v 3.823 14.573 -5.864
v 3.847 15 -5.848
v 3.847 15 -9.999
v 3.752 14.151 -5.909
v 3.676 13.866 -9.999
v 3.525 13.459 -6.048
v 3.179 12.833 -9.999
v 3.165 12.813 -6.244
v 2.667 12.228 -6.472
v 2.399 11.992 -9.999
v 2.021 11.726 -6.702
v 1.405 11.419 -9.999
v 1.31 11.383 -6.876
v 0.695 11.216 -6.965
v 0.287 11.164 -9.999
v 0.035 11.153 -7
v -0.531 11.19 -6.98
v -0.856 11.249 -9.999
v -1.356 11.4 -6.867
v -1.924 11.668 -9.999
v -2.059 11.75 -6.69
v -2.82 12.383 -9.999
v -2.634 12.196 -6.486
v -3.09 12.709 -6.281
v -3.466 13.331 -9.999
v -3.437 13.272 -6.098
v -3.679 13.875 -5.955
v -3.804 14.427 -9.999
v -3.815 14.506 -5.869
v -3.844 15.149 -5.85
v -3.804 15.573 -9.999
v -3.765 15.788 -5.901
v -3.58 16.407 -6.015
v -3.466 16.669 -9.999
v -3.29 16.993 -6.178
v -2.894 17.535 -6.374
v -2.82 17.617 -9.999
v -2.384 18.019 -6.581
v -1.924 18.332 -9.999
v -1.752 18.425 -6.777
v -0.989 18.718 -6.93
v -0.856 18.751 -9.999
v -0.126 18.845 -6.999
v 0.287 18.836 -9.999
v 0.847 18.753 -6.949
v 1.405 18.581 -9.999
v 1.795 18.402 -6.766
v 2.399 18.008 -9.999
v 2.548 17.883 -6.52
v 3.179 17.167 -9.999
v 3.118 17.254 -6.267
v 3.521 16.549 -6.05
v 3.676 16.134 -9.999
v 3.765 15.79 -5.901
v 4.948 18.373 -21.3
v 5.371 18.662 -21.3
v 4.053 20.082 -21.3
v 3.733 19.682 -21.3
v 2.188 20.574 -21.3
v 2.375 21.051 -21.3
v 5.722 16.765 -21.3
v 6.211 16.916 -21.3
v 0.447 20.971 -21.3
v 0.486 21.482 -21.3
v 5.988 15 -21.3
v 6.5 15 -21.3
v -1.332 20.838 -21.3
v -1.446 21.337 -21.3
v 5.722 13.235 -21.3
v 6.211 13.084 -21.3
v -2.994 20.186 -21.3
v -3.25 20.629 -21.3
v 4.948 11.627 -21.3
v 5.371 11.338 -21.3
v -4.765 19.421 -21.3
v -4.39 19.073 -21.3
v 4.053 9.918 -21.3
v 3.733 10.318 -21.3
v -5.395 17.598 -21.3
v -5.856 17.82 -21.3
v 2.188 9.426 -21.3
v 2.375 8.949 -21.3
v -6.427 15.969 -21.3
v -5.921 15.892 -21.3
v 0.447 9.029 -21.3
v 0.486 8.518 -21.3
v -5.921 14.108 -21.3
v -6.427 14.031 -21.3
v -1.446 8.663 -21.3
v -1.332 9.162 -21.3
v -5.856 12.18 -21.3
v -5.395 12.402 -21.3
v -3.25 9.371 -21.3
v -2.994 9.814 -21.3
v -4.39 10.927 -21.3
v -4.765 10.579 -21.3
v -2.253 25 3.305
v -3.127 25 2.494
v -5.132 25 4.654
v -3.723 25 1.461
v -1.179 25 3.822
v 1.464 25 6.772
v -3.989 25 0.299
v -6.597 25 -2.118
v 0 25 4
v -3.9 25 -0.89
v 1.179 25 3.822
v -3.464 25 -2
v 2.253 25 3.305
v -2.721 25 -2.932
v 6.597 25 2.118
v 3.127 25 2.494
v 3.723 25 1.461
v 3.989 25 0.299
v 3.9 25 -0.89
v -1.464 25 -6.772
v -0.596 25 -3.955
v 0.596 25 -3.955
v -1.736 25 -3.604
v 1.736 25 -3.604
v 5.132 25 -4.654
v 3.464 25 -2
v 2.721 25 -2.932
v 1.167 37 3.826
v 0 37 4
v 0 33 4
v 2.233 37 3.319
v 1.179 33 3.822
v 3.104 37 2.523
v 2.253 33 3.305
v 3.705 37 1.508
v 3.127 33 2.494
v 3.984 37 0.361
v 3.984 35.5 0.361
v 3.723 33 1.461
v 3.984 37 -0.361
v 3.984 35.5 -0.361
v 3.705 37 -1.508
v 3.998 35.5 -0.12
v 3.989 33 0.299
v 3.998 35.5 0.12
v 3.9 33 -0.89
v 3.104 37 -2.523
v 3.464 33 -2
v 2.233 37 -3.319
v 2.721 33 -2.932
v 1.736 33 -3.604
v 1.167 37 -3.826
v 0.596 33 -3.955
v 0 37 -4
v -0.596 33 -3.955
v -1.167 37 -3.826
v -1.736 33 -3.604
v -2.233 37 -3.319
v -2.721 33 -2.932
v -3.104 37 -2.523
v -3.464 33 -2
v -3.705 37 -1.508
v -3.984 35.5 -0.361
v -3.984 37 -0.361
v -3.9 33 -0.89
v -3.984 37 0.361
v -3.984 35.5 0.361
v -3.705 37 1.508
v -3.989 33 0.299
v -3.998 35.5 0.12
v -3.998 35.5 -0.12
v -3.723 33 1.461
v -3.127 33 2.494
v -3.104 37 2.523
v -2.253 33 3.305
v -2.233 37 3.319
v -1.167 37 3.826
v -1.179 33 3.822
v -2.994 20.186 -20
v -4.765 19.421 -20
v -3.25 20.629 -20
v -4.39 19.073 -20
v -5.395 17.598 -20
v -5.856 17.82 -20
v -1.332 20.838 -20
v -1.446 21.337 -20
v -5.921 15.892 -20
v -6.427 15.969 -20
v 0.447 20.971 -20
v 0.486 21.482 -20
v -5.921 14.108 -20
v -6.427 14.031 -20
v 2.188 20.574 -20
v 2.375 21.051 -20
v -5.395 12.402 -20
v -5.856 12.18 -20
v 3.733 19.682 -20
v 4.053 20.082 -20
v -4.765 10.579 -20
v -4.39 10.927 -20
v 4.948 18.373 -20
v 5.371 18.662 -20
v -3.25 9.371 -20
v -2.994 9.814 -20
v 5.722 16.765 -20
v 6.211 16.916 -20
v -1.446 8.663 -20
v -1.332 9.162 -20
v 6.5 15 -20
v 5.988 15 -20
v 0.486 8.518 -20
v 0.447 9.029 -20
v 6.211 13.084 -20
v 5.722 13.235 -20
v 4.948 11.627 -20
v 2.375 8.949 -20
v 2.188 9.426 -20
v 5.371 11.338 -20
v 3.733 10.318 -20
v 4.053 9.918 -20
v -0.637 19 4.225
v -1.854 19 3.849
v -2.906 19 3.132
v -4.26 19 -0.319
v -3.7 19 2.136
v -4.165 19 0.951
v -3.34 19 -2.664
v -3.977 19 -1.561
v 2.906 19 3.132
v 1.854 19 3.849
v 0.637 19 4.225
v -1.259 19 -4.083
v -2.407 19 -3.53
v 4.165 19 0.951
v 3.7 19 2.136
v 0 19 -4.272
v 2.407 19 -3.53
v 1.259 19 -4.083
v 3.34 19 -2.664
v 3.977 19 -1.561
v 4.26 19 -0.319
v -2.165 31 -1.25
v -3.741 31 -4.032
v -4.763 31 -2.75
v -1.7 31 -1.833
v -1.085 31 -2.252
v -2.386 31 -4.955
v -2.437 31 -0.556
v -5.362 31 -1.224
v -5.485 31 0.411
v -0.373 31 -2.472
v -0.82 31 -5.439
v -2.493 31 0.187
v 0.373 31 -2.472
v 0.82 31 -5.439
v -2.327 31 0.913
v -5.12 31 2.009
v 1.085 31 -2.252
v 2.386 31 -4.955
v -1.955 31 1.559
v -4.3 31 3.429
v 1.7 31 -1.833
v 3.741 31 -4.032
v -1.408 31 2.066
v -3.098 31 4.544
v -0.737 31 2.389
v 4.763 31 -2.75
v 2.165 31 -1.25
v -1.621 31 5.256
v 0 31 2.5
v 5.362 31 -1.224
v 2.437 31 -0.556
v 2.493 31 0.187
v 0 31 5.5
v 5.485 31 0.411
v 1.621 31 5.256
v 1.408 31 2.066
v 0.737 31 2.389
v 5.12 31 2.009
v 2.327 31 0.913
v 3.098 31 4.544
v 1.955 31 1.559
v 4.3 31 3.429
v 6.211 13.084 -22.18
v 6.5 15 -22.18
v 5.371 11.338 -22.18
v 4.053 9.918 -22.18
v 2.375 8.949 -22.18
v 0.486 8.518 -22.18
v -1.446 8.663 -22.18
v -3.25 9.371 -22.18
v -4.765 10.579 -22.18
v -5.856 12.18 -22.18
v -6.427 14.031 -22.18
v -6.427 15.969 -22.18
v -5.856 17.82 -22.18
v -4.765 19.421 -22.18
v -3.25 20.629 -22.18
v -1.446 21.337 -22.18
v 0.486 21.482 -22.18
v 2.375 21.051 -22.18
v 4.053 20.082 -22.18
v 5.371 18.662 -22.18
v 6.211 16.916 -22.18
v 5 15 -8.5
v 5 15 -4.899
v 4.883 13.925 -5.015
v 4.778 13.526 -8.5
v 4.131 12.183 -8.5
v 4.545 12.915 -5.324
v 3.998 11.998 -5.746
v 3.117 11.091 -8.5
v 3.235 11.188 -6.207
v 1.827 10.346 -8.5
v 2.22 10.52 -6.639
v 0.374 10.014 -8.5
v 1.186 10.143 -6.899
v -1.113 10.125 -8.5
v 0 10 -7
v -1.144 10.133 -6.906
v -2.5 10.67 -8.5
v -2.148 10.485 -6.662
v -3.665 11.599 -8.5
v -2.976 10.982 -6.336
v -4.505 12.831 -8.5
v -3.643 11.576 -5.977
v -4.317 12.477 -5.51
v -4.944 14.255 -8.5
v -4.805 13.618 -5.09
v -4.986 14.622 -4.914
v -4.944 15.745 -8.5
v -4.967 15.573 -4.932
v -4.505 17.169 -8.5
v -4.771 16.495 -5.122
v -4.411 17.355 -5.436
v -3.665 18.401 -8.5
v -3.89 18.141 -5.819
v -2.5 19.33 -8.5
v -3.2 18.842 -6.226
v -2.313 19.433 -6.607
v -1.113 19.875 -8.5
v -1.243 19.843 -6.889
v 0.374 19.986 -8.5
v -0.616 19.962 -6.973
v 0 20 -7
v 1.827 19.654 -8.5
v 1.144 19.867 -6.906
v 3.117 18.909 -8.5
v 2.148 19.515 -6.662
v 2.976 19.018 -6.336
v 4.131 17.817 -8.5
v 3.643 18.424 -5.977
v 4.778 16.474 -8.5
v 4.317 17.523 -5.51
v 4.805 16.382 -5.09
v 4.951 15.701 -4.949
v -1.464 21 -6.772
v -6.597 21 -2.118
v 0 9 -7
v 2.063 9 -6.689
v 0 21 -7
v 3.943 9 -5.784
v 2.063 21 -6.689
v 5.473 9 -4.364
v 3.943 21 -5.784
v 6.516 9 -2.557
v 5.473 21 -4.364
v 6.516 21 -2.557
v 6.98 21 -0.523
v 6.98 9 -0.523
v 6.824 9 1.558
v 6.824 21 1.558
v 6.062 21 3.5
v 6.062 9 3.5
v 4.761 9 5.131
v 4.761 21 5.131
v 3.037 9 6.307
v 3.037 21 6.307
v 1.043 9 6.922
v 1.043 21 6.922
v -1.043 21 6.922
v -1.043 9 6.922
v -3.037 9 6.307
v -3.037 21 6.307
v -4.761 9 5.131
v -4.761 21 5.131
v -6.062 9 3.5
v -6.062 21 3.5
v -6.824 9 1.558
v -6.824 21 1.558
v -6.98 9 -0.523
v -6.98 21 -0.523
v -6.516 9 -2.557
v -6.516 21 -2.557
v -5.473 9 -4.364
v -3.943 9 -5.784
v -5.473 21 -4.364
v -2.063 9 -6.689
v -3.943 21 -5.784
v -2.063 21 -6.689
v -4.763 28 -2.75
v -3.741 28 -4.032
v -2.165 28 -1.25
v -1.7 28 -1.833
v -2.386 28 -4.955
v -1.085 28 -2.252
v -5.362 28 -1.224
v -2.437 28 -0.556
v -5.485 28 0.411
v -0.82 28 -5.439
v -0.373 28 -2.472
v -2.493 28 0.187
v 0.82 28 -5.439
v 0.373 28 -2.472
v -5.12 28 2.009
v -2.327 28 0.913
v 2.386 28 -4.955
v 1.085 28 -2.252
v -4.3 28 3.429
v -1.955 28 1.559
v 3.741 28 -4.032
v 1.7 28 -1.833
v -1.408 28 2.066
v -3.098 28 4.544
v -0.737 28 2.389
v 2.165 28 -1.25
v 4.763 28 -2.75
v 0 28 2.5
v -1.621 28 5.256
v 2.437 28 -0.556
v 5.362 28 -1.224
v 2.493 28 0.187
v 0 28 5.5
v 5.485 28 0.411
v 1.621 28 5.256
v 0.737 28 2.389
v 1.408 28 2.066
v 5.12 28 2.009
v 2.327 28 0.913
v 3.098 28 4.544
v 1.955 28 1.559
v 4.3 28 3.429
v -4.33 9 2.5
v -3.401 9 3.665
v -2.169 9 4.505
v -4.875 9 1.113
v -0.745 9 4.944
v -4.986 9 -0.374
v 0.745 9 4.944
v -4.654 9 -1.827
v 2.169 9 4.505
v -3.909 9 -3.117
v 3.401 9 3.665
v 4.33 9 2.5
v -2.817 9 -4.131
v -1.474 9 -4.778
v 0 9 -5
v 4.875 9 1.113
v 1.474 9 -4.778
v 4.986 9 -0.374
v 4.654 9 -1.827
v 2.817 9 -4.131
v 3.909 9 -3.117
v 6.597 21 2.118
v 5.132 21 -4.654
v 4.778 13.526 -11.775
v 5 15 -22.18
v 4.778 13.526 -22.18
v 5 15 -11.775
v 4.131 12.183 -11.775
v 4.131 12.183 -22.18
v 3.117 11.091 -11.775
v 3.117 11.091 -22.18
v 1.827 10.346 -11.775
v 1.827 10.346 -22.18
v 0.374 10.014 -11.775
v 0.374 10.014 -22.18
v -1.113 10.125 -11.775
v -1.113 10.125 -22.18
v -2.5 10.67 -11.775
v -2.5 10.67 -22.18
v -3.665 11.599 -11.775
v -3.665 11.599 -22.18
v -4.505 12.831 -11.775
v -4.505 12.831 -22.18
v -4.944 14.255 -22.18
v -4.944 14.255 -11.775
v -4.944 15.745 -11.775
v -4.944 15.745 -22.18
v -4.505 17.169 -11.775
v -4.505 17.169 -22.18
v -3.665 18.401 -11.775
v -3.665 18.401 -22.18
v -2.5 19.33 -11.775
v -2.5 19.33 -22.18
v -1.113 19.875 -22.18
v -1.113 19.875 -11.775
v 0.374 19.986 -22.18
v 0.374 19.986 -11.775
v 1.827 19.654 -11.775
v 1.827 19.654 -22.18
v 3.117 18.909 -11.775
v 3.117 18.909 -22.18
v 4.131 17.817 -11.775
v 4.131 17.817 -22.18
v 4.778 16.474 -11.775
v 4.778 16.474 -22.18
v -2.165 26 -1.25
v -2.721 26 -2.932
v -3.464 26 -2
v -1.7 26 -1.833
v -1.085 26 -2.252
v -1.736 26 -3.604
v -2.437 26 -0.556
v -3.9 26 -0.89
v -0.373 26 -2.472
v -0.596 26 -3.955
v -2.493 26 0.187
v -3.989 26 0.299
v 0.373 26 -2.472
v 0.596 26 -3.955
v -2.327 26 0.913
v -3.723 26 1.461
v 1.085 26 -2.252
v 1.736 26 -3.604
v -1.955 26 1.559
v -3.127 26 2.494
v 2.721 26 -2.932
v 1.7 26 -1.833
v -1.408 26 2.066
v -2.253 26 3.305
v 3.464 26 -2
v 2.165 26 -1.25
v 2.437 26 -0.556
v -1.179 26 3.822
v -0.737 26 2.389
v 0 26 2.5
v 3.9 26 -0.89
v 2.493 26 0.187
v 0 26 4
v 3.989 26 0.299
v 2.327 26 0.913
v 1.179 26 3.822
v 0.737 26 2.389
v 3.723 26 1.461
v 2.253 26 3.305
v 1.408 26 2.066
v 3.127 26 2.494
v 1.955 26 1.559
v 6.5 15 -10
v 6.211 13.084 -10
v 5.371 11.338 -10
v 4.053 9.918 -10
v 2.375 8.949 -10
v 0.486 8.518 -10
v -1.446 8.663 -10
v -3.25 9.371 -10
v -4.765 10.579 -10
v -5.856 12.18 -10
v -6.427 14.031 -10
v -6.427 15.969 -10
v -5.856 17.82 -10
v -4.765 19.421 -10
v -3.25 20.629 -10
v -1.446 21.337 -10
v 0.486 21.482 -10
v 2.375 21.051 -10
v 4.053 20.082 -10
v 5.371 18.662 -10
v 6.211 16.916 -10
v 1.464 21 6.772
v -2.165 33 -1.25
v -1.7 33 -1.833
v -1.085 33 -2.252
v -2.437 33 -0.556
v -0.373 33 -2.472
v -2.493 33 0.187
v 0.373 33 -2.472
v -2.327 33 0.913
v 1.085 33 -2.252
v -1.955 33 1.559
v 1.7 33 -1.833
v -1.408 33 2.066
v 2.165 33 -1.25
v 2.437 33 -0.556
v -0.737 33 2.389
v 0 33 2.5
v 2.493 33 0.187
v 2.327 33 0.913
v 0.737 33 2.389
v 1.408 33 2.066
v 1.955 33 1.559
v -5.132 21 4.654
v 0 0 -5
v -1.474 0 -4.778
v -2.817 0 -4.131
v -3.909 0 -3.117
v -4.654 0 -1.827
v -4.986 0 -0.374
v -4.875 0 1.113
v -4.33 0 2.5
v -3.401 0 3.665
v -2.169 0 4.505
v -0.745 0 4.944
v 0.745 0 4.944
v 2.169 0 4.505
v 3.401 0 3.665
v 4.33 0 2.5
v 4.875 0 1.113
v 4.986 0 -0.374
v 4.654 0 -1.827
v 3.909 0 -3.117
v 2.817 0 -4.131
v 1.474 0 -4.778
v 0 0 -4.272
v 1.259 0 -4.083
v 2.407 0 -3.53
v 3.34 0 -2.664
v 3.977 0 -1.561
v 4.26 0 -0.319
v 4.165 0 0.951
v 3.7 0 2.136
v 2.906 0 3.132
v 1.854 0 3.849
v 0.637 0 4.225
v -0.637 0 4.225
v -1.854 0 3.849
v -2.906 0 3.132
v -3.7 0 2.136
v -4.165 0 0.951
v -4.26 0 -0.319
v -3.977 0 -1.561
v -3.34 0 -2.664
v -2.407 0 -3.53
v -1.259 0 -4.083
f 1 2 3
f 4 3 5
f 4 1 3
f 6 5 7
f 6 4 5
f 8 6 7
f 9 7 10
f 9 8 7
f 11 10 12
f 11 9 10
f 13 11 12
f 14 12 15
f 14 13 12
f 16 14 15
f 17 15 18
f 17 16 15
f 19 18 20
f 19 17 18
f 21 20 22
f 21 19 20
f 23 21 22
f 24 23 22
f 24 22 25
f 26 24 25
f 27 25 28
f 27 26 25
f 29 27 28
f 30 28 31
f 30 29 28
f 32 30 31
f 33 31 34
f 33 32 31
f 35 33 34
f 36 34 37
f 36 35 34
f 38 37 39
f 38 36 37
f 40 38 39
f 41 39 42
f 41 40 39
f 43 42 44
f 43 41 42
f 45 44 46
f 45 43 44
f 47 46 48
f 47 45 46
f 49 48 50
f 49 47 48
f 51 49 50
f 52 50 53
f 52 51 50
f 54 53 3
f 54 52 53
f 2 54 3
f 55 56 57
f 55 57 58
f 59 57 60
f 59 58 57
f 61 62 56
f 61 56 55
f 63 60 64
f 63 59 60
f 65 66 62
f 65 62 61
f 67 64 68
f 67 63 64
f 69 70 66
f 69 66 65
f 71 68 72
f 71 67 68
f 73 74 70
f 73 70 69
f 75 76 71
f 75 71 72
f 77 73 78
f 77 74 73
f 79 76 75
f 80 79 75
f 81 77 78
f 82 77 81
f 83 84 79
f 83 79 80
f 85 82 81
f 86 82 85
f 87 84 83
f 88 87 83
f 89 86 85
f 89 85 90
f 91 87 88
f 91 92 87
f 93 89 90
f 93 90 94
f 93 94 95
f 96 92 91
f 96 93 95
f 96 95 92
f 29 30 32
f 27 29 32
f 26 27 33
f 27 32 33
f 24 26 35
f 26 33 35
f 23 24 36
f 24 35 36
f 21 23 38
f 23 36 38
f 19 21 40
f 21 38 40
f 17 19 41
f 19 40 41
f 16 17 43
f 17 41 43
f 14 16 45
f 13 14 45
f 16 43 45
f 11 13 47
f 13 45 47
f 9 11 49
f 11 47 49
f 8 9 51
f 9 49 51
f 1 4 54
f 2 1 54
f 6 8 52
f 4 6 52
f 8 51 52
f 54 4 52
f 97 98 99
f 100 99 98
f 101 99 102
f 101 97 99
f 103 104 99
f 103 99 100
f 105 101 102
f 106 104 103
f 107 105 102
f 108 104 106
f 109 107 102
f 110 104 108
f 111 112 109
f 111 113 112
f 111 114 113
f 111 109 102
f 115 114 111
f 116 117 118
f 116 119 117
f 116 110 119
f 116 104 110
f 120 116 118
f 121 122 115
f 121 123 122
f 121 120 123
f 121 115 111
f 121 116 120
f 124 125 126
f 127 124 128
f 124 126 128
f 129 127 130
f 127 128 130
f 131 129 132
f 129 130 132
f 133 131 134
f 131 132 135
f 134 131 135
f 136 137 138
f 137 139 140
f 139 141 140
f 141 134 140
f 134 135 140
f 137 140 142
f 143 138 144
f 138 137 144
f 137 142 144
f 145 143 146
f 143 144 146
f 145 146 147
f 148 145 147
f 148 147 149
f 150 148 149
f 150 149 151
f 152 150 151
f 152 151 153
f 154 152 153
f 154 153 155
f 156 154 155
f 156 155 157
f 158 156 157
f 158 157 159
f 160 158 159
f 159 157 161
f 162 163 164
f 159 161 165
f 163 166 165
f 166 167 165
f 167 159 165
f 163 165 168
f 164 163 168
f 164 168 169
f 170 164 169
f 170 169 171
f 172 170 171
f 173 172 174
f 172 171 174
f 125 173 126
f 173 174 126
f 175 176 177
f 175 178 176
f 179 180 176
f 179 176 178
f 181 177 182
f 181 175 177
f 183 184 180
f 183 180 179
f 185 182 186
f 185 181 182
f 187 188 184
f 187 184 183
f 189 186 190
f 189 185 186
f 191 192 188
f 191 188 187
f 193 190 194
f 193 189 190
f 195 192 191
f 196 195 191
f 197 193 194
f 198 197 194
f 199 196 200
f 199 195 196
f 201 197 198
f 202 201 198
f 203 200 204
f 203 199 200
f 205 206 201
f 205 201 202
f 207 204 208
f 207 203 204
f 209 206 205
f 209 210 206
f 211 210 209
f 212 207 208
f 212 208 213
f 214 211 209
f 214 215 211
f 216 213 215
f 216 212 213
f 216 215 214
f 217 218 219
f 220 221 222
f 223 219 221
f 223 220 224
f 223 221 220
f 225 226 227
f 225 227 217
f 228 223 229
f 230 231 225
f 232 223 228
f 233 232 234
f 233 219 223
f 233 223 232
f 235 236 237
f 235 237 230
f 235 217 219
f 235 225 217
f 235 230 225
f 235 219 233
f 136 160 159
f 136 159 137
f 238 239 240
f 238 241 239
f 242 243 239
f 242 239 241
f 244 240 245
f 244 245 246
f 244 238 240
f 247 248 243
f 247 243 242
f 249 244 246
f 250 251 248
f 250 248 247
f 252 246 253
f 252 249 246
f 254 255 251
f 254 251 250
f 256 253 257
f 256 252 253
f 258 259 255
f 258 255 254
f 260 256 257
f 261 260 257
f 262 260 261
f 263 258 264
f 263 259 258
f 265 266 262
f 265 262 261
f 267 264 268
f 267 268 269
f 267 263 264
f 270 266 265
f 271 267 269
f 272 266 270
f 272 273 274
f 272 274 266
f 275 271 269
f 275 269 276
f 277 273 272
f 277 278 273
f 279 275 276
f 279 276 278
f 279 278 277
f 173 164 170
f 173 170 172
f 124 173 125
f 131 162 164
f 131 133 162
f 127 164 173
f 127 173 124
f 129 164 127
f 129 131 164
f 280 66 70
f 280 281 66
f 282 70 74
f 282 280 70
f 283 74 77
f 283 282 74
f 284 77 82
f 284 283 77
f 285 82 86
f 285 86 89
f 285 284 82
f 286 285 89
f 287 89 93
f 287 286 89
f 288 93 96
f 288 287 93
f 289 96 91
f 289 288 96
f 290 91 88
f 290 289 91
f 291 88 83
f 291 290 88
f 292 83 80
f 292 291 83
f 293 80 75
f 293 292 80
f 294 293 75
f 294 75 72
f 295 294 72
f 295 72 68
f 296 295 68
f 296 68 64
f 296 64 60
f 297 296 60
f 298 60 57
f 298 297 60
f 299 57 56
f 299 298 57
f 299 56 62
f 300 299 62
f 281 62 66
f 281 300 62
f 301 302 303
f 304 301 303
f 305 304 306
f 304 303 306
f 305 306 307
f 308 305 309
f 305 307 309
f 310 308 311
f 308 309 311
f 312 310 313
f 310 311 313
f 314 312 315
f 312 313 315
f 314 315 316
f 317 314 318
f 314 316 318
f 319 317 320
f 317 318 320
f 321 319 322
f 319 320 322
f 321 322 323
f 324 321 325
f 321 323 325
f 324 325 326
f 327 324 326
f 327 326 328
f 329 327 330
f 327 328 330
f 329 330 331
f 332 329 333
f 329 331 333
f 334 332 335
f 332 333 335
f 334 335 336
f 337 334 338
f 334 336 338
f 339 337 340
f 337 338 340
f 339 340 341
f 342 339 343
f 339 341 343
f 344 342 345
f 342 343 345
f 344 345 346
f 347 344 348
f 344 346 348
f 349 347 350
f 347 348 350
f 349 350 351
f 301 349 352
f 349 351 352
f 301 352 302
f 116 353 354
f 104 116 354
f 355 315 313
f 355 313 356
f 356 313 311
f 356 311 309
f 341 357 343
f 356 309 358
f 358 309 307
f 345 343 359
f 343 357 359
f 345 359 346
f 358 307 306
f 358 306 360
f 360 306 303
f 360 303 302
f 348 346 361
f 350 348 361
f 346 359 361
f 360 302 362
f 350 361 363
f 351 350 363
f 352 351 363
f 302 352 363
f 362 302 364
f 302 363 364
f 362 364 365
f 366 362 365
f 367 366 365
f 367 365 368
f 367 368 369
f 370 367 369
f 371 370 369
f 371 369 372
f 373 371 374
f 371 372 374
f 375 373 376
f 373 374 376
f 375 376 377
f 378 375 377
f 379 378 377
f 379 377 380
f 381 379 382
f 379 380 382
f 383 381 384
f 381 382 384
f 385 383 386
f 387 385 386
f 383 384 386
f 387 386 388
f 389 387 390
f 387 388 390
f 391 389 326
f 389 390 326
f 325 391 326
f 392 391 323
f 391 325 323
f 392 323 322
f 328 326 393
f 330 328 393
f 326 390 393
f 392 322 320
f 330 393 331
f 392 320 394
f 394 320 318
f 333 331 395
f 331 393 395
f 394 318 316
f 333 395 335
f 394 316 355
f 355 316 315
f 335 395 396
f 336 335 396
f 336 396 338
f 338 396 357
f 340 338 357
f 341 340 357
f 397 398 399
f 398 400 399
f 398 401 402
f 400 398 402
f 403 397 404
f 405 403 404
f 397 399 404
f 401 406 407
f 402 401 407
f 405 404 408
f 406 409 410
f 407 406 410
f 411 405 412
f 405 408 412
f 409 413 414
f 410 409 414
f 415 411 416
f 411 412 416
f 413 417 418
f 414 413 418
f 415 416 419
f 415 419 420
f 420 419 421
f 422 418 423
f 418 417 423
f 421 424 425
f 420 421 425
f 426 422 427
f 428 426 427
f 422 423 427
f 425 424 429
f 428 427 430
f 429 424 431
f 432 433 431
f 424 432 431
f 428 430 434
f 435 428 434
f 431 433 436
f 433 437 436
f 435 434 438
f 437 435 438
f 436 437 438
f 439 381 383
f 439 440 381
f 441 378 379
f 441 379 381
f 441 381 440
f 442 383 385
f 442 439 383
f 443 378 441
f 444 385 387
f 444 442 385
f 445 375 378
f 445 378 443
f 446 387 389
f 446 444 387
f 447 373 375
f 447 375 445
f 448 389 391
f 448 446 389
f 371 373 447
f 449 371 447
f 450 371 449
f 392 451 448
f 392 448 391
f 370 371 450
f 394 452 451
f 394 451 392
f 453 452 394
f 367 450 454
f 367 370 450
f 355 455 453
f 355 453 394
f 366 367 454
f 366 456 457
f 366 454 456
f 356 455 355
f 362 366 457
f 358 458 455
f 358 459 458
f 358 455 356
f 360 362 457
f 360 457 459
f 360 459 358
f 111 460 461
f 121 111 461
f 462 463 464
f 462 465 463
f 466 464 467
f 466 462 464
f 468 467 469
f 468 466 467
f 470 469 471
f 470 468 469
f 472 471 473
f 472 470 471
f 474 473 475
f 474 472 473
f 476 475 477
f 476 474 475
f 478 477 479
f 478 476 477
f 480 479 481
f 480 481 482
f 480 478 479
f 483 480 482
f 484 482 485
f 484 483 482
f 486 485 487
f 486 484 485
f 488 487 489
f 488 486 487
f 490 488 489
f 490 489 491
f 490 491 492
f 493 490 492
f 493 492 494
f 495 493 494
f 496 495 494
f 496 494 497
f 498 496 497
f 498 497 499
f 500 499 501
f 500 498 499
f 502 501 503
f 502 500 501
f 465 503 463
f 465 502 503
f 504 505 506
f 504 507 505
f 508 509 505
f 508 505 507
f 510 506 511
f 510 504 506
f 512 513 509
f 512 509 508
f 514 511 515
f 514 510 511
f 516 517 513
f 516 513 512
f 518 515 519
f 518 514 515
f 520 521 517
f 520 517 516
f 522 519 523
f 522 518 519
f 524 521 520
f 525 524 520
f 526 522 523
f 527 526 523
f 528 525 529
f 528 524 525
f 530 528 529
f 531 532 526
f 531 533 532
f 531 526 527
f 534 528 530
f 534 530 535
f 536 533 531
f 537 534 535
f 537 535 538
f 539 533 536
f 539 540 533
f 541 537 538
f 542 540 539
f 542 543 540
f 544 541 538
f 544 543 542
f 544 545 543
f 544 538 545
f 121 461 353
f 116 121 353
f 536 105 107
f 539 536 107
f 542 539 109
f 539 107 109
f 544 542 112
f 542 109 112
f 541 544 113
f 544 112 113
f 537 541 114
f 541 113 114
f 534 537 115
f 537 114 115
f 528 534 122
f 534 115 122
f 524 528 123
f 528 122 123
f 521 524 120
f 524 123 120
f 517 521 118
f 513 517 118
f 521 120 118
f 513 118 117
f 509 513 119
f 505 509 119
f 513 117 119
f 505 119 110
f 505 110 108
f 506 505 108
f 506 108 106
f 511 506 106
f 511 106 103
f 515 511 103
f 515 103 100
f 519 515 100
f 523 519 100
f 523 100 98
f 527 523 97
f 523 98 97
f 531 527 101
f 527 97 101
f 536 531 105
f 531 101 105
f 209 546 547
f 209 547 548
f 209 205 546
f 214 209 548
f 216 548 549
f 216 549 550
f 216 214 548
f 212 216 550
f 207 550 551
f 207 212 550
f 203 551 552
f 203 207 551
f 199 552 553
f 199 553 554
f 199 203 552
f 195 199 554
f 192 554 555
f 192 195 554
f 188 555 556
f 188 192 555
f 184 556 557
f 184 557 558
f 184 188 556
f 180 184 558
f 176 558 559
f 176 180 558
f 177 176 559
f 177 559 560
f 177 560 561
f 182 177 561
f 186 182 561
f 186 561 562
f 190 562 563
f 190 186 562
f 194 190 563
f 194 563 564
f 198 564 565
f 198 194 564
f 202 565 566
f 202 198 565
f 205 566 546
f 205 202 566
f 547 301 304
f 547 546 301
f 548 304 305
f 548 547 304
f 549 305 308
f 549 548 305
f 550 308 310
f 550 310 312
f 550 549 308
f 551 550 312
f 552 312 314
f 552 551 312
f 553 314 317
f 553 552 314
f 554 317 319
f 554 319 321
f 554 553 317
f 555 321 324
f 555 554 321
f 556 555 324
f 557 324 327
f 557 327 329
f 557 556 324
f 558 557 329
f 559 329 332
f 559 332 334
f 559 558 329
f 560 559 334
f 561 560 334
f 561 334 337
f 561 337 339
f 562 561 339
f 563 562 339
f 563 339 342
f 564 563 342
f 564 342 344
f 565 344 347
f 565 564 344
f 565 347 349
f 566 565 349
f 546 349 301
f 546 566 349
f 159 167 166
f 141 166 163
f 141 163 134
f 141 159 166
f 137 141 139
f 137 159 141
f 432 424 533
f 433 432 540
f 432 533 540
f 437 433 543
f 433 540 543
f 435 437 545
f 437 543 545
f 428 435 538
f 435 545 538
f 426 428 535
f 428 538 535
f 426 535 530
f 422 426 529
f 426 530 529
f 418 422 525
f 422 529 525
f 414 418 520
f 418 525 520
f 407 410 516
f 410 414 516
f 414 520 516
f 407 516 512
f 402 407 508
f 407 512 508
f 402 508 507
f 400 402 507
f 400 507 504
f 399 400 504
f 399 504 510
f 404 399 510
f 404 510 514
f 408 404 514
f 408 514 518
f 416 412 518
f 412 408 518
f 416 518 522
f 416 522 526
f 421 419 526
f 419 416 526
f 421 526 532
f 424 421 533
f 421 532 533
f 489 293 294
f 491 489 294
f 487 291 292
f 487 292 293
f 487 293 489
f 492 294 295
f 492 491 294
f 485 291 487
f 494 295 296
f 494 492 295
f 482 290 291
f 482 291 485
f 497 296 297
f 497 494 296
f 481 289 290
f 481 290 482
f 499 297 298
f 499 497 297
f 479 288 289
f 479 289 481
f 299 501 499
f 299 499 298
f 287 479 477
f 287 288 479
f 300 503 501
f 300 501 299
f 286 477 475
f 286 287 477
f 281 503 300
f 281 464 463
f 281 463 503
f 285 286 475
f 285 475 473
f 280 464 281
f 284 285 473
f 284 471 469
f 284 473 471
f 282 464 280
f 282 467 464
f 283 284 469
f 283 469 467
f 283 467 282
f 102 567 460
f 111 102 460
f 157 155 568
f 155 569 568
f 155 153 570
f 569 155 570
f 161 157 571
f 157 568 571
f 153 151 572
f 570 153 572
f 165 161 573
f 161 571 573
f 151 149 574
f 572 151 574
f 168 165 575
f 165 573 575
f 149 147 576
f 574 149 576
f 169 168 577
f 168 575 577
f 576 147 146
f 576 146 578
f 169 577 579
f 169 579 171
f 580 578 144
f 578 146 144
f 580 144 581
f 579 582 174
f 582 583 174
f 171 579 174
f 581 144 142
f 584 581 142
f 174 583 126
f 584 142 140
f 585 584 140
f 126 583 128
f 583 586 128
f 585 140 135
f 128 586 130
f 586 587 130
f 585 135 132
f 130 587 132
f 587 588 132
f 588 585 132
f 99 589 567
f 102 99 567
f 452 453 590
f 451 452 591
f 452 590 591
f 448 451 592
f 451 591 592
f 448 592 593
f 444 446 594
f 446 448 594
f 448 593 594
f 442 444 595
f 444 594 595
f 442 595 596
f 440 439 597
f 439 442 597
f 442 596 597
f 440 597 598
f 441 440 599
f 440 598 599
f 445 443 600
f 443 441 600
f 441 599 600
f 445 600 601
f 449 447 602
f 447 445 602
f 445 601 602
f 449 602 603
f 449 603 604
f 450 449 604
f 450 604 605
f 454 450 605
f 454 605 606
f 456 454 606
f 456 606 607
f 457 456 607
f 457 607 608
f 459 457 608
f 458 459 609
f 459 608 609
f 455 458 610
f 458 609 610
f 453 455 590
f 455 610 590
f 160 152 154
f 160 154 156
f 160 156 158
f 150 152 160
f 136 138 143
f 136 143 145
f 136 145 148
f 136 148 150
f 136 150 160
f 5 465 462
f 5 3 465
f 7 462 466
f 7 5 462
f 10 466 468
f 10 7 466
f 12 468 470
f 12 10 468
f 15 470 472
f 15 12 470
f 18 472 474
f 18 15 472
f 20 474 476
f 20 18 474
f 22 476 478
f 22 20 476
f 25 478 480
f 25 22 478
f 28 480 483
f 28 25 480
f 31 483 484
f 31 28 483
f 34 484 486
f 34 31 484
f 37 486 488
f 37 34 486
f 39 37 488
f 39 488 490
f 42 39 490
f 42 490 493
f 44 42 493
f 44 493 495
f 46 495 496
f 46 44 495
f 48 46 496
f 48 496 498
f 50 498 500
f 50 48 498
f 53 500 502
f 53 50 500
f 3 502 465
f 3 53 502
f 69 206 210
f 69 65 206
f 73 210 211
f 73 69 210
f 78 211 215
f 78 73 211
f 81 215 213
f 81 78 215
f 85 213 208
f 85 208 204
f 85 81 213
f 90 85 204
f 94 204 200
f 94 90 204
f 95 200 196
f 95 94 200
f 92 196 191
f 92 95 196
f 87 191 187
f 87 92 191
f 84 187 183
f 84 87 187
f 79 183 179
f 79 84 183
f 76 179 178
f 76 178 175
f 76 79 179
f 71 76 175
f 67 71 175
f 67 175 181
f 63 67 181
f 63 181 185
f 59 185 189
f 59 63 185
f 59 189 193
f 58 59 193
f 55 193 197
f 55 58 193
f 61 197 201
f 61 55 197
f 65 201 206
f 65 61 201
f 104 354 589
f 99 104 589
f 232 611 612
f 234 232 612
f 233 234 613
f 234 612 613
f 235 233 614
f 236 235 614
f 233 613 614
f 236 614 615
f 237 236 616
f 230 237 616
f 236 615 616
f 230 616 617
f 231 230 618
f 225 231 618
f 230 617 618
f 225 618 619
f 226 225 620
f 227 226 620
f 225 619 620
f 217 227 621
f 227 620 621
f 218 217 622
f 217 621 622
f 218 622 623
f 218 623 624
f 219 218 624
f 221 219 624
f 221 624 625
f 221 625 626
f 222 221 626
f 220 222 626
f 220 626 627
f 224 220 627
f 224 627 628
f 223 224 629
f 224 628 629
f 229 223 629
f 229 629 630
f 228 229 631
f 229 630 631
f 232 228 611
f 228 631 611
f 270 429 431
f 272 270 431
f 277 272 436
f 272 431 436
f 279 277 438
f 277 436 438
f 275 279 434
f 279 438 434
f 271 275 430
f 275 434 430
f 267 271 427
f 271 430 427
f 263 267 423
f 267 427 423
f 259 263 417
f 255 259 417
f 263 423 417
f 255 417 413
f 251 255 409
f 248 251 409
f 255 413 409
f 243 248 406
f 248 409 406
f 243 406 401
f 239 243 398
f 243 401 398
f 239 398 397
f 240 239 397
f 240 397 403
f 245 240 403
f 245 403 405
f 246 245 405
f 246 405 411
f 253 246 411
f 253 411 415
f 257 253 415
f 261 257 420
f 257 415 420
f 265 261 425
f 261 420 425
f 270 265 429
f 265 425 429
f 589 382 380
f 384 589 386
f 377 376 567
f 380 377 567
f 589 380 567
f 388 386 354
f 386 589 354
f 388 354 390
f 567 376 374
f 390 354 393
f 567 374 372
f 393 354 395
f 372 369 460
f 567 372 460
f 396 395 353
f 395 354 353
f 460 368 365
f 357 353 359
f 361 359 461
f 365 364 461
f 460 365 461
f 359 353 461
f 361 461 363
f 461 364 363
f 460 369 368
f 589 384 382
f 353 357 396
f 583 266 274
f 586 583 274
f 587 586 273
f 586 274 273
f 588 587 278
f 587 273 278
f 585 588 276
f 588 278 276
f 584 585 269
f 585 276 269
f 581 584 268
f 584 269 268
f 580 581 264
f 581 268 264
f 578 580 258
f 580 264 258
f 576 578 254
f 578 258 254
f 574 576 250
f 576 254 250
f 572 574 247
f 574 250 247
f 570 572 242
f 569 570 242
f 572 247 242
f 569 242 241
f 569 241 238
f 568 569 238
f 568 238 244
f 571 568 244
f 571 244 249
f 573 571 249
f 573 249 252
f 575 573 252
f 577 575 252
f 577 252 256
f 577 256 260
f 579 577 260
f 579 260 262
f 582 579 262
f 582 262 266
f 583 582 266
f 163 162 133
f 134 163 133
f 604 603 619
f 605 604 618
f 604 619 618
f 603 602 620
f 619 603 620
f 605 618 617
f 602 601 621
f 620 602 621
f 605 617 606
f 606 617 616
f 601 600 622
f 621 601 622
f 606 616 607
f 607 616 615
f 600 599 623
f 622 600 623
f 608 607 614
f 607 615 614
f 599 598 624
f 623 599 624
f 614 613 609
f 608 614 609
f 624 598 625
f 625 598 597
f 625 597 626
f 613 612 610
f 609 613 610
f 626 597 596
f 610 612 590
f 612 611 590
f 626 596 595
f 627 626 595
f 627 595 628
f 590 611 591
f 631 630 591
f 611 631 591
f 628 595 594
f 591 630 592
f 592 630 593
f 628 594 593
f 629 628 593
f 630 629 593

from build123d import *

# Parameters (mm, degrees)
SKETCH_1_R           = 5
EXTRUDE_1_DEPTH      = 21
EXTRUDE_2_DEPTH      = 4
SKETCH_3_R           = 4
EXTRUDE_3_DEPTH      = 1
SKETCH_4_R           = 2.5
EXTRUDE_4_DEPTH      = 7
SKETCH_5_R           = 4
EXTRUDE_5_DEPTH      = 4
SKETCH_6_R           = 5.5
EXTRUDE_6_DEPTH      = 3
SKETCH_7_R           = 7
SKETCH_7_R_2         = 5
EXTRUDE_7_DEPTH      = 12
SKETCH_9_W           = 9.328895196
SKETCH_9_H           = 0.721756852
CUT_EXTRUDE_9_DEPTH  = 1.5
SKETCH_10_R          = 4.2723733
CUT_EXTRUDE_10_DEPTH = 19


with BuildPart() as part:
    # 草图1 → 拉伸1 (new body)
    with BuildSketch(Plane(origin=(0, 0, 0), x_dir=(1, 0, 0), z_dir=(0, 1, 0))):
        with Locations(Location((0, 0, 0), (0, 0, 90))):
            Circle(SKETCH_1_R)
    extrude(amount=EXTRUDE_1_DEPTH)

    # 草图2 → 拉伸2 (add)
    with BuildSketch(Plane(origin=(0, 21, 0), x_dir=(1, 0, 0), z_dir=(0, 1, 0))):
        Polygon((5.132313302, 4.653961771), (-1.464292471, 6.771694586), (-6.596605773, 2.117732814), (-5.132313302, -4.653961771), (1.464292471, -6.771694586), (6.596605773, -2.117732814), align=None)
    extrude(amount=EXTRUDE_2_DEPTH)

    # 草图3 → 拉伸3 (add)
    with BuildSketch(Plane(origin=(0, 25, 0), x_dir=(1, 0, 0), z_dir=(0, 1, 0))):
        with Locations(Location((0, 0, 0), (0, 0, 270))):
            Circle(SKETCH_3_R)
    extrude(amount=EXTRUDE_3_DEPTH)

    # 草图4 → 拉伸4 (add)
    with BuildSketch(Plane(origin=(0, 26, 0), x_dir=(1, 0, 0), z_dir=(0, 1, 0))):
        with Locations(Location((0, 0, 0), (0, 0, 270))):
            Circle(SKETCH_4_R)
    extrude(amount=EXTRUDE_4_DEPTH)

    # 草图5 → 拉伸5 (add)
    with BuildSketch(Plane(origin=(0, 33, 0), x_dir=(1, 0, 0), z_dir=(0, 1, 0))):
        with Locations(Location((0, 0, 0), (0, 0, 270))):
            Circle(SKETCH_5_R)
    extrude(amount=EXTRUDE_5_DEPTH)

    # 草图6 → 拉伸6 (add)
    with BuildSketch(Plane(origin=(0, 28, 0), x_dir=(-1, 0, 0), z_dir=(0, 1, 0))):
        with Locations(Location((0, 0, 0), (0, 0, 90))):
            Circle(SKETCH_6_R)
    extrude(amount=EXTRUDE_6_DEPTH)



with BuildPart() as body_2:
    # 草图7 → 拉伸7 (new body)
    with BuildSketch(Plane.XZ.offset(-21)):
        with Locations(Location((0, 0, 0), (0, 0, 270))):
            Circle(SKETCH_7_R)
        with Locations(Location((0, 0, 0), (0, 0, 270))):
            Circle(SKETCH_7_R_2, mode=Mode.SUBTRACT)
    extrude(amount=EXTRUDE_7_DEPTH)


with BuildPart() as part_1:
    add(part.part)

    add(body_2.part)  # 旋转1 merges body 2
    # 草图8 → 旋转1 (revolve)
    with BuildSketch(Plane(origin=(0, 0, 0), x_dir=(0, 0, -1), z_dir=(1, 0, 0)), mode=Mode.PRIVATE) as revolve_1_sk:
        Polygon((3.877064073, 18.84702899), (3.877064073, 20), (5.073285263, 20), (8.5, 20), (10, 21.5), (20, 21.5), (20, 20.988021683), (21.3, 20.988021683), (21.3, 21.5), (22.180246255, 21.5), (22.180246255, 20), (11.774720378, 20), (9.998528163, 18.84702899), align=None)
    revolve(revolve_1_sk.sketch.rotate(Axis((0, 15, 0), (0, 0, -1)), 90), axis=Axis((0, 15, 0), (0, 0, -1)))

    # 草图9 → 拉伸9 (cut)
    with BuildSketch(Plane(origin=(0, 37, 0), x_dir=(1, 0, 0), z_dir=(0, 1, 0))):
        Rectangle(SKETCH_9_W, SKETCH_9_H)
    extrude(amount=-CUT_EXTRUDE_9_DEPTH, mode=Mode.SUBTRACT)

    # 草图10 → 拉伸10 (cut)
    with BuildSketch(Plane.XZ):
        with Locations(Location((0, 0, 0), (0, 0, 270))):
            Circle(SKETCH_10_R)
    extrude(amount=-CUT_EXTRUDE_10_DEPTH, mode=Mode.SUBTRACT)


solid = part_1.part
